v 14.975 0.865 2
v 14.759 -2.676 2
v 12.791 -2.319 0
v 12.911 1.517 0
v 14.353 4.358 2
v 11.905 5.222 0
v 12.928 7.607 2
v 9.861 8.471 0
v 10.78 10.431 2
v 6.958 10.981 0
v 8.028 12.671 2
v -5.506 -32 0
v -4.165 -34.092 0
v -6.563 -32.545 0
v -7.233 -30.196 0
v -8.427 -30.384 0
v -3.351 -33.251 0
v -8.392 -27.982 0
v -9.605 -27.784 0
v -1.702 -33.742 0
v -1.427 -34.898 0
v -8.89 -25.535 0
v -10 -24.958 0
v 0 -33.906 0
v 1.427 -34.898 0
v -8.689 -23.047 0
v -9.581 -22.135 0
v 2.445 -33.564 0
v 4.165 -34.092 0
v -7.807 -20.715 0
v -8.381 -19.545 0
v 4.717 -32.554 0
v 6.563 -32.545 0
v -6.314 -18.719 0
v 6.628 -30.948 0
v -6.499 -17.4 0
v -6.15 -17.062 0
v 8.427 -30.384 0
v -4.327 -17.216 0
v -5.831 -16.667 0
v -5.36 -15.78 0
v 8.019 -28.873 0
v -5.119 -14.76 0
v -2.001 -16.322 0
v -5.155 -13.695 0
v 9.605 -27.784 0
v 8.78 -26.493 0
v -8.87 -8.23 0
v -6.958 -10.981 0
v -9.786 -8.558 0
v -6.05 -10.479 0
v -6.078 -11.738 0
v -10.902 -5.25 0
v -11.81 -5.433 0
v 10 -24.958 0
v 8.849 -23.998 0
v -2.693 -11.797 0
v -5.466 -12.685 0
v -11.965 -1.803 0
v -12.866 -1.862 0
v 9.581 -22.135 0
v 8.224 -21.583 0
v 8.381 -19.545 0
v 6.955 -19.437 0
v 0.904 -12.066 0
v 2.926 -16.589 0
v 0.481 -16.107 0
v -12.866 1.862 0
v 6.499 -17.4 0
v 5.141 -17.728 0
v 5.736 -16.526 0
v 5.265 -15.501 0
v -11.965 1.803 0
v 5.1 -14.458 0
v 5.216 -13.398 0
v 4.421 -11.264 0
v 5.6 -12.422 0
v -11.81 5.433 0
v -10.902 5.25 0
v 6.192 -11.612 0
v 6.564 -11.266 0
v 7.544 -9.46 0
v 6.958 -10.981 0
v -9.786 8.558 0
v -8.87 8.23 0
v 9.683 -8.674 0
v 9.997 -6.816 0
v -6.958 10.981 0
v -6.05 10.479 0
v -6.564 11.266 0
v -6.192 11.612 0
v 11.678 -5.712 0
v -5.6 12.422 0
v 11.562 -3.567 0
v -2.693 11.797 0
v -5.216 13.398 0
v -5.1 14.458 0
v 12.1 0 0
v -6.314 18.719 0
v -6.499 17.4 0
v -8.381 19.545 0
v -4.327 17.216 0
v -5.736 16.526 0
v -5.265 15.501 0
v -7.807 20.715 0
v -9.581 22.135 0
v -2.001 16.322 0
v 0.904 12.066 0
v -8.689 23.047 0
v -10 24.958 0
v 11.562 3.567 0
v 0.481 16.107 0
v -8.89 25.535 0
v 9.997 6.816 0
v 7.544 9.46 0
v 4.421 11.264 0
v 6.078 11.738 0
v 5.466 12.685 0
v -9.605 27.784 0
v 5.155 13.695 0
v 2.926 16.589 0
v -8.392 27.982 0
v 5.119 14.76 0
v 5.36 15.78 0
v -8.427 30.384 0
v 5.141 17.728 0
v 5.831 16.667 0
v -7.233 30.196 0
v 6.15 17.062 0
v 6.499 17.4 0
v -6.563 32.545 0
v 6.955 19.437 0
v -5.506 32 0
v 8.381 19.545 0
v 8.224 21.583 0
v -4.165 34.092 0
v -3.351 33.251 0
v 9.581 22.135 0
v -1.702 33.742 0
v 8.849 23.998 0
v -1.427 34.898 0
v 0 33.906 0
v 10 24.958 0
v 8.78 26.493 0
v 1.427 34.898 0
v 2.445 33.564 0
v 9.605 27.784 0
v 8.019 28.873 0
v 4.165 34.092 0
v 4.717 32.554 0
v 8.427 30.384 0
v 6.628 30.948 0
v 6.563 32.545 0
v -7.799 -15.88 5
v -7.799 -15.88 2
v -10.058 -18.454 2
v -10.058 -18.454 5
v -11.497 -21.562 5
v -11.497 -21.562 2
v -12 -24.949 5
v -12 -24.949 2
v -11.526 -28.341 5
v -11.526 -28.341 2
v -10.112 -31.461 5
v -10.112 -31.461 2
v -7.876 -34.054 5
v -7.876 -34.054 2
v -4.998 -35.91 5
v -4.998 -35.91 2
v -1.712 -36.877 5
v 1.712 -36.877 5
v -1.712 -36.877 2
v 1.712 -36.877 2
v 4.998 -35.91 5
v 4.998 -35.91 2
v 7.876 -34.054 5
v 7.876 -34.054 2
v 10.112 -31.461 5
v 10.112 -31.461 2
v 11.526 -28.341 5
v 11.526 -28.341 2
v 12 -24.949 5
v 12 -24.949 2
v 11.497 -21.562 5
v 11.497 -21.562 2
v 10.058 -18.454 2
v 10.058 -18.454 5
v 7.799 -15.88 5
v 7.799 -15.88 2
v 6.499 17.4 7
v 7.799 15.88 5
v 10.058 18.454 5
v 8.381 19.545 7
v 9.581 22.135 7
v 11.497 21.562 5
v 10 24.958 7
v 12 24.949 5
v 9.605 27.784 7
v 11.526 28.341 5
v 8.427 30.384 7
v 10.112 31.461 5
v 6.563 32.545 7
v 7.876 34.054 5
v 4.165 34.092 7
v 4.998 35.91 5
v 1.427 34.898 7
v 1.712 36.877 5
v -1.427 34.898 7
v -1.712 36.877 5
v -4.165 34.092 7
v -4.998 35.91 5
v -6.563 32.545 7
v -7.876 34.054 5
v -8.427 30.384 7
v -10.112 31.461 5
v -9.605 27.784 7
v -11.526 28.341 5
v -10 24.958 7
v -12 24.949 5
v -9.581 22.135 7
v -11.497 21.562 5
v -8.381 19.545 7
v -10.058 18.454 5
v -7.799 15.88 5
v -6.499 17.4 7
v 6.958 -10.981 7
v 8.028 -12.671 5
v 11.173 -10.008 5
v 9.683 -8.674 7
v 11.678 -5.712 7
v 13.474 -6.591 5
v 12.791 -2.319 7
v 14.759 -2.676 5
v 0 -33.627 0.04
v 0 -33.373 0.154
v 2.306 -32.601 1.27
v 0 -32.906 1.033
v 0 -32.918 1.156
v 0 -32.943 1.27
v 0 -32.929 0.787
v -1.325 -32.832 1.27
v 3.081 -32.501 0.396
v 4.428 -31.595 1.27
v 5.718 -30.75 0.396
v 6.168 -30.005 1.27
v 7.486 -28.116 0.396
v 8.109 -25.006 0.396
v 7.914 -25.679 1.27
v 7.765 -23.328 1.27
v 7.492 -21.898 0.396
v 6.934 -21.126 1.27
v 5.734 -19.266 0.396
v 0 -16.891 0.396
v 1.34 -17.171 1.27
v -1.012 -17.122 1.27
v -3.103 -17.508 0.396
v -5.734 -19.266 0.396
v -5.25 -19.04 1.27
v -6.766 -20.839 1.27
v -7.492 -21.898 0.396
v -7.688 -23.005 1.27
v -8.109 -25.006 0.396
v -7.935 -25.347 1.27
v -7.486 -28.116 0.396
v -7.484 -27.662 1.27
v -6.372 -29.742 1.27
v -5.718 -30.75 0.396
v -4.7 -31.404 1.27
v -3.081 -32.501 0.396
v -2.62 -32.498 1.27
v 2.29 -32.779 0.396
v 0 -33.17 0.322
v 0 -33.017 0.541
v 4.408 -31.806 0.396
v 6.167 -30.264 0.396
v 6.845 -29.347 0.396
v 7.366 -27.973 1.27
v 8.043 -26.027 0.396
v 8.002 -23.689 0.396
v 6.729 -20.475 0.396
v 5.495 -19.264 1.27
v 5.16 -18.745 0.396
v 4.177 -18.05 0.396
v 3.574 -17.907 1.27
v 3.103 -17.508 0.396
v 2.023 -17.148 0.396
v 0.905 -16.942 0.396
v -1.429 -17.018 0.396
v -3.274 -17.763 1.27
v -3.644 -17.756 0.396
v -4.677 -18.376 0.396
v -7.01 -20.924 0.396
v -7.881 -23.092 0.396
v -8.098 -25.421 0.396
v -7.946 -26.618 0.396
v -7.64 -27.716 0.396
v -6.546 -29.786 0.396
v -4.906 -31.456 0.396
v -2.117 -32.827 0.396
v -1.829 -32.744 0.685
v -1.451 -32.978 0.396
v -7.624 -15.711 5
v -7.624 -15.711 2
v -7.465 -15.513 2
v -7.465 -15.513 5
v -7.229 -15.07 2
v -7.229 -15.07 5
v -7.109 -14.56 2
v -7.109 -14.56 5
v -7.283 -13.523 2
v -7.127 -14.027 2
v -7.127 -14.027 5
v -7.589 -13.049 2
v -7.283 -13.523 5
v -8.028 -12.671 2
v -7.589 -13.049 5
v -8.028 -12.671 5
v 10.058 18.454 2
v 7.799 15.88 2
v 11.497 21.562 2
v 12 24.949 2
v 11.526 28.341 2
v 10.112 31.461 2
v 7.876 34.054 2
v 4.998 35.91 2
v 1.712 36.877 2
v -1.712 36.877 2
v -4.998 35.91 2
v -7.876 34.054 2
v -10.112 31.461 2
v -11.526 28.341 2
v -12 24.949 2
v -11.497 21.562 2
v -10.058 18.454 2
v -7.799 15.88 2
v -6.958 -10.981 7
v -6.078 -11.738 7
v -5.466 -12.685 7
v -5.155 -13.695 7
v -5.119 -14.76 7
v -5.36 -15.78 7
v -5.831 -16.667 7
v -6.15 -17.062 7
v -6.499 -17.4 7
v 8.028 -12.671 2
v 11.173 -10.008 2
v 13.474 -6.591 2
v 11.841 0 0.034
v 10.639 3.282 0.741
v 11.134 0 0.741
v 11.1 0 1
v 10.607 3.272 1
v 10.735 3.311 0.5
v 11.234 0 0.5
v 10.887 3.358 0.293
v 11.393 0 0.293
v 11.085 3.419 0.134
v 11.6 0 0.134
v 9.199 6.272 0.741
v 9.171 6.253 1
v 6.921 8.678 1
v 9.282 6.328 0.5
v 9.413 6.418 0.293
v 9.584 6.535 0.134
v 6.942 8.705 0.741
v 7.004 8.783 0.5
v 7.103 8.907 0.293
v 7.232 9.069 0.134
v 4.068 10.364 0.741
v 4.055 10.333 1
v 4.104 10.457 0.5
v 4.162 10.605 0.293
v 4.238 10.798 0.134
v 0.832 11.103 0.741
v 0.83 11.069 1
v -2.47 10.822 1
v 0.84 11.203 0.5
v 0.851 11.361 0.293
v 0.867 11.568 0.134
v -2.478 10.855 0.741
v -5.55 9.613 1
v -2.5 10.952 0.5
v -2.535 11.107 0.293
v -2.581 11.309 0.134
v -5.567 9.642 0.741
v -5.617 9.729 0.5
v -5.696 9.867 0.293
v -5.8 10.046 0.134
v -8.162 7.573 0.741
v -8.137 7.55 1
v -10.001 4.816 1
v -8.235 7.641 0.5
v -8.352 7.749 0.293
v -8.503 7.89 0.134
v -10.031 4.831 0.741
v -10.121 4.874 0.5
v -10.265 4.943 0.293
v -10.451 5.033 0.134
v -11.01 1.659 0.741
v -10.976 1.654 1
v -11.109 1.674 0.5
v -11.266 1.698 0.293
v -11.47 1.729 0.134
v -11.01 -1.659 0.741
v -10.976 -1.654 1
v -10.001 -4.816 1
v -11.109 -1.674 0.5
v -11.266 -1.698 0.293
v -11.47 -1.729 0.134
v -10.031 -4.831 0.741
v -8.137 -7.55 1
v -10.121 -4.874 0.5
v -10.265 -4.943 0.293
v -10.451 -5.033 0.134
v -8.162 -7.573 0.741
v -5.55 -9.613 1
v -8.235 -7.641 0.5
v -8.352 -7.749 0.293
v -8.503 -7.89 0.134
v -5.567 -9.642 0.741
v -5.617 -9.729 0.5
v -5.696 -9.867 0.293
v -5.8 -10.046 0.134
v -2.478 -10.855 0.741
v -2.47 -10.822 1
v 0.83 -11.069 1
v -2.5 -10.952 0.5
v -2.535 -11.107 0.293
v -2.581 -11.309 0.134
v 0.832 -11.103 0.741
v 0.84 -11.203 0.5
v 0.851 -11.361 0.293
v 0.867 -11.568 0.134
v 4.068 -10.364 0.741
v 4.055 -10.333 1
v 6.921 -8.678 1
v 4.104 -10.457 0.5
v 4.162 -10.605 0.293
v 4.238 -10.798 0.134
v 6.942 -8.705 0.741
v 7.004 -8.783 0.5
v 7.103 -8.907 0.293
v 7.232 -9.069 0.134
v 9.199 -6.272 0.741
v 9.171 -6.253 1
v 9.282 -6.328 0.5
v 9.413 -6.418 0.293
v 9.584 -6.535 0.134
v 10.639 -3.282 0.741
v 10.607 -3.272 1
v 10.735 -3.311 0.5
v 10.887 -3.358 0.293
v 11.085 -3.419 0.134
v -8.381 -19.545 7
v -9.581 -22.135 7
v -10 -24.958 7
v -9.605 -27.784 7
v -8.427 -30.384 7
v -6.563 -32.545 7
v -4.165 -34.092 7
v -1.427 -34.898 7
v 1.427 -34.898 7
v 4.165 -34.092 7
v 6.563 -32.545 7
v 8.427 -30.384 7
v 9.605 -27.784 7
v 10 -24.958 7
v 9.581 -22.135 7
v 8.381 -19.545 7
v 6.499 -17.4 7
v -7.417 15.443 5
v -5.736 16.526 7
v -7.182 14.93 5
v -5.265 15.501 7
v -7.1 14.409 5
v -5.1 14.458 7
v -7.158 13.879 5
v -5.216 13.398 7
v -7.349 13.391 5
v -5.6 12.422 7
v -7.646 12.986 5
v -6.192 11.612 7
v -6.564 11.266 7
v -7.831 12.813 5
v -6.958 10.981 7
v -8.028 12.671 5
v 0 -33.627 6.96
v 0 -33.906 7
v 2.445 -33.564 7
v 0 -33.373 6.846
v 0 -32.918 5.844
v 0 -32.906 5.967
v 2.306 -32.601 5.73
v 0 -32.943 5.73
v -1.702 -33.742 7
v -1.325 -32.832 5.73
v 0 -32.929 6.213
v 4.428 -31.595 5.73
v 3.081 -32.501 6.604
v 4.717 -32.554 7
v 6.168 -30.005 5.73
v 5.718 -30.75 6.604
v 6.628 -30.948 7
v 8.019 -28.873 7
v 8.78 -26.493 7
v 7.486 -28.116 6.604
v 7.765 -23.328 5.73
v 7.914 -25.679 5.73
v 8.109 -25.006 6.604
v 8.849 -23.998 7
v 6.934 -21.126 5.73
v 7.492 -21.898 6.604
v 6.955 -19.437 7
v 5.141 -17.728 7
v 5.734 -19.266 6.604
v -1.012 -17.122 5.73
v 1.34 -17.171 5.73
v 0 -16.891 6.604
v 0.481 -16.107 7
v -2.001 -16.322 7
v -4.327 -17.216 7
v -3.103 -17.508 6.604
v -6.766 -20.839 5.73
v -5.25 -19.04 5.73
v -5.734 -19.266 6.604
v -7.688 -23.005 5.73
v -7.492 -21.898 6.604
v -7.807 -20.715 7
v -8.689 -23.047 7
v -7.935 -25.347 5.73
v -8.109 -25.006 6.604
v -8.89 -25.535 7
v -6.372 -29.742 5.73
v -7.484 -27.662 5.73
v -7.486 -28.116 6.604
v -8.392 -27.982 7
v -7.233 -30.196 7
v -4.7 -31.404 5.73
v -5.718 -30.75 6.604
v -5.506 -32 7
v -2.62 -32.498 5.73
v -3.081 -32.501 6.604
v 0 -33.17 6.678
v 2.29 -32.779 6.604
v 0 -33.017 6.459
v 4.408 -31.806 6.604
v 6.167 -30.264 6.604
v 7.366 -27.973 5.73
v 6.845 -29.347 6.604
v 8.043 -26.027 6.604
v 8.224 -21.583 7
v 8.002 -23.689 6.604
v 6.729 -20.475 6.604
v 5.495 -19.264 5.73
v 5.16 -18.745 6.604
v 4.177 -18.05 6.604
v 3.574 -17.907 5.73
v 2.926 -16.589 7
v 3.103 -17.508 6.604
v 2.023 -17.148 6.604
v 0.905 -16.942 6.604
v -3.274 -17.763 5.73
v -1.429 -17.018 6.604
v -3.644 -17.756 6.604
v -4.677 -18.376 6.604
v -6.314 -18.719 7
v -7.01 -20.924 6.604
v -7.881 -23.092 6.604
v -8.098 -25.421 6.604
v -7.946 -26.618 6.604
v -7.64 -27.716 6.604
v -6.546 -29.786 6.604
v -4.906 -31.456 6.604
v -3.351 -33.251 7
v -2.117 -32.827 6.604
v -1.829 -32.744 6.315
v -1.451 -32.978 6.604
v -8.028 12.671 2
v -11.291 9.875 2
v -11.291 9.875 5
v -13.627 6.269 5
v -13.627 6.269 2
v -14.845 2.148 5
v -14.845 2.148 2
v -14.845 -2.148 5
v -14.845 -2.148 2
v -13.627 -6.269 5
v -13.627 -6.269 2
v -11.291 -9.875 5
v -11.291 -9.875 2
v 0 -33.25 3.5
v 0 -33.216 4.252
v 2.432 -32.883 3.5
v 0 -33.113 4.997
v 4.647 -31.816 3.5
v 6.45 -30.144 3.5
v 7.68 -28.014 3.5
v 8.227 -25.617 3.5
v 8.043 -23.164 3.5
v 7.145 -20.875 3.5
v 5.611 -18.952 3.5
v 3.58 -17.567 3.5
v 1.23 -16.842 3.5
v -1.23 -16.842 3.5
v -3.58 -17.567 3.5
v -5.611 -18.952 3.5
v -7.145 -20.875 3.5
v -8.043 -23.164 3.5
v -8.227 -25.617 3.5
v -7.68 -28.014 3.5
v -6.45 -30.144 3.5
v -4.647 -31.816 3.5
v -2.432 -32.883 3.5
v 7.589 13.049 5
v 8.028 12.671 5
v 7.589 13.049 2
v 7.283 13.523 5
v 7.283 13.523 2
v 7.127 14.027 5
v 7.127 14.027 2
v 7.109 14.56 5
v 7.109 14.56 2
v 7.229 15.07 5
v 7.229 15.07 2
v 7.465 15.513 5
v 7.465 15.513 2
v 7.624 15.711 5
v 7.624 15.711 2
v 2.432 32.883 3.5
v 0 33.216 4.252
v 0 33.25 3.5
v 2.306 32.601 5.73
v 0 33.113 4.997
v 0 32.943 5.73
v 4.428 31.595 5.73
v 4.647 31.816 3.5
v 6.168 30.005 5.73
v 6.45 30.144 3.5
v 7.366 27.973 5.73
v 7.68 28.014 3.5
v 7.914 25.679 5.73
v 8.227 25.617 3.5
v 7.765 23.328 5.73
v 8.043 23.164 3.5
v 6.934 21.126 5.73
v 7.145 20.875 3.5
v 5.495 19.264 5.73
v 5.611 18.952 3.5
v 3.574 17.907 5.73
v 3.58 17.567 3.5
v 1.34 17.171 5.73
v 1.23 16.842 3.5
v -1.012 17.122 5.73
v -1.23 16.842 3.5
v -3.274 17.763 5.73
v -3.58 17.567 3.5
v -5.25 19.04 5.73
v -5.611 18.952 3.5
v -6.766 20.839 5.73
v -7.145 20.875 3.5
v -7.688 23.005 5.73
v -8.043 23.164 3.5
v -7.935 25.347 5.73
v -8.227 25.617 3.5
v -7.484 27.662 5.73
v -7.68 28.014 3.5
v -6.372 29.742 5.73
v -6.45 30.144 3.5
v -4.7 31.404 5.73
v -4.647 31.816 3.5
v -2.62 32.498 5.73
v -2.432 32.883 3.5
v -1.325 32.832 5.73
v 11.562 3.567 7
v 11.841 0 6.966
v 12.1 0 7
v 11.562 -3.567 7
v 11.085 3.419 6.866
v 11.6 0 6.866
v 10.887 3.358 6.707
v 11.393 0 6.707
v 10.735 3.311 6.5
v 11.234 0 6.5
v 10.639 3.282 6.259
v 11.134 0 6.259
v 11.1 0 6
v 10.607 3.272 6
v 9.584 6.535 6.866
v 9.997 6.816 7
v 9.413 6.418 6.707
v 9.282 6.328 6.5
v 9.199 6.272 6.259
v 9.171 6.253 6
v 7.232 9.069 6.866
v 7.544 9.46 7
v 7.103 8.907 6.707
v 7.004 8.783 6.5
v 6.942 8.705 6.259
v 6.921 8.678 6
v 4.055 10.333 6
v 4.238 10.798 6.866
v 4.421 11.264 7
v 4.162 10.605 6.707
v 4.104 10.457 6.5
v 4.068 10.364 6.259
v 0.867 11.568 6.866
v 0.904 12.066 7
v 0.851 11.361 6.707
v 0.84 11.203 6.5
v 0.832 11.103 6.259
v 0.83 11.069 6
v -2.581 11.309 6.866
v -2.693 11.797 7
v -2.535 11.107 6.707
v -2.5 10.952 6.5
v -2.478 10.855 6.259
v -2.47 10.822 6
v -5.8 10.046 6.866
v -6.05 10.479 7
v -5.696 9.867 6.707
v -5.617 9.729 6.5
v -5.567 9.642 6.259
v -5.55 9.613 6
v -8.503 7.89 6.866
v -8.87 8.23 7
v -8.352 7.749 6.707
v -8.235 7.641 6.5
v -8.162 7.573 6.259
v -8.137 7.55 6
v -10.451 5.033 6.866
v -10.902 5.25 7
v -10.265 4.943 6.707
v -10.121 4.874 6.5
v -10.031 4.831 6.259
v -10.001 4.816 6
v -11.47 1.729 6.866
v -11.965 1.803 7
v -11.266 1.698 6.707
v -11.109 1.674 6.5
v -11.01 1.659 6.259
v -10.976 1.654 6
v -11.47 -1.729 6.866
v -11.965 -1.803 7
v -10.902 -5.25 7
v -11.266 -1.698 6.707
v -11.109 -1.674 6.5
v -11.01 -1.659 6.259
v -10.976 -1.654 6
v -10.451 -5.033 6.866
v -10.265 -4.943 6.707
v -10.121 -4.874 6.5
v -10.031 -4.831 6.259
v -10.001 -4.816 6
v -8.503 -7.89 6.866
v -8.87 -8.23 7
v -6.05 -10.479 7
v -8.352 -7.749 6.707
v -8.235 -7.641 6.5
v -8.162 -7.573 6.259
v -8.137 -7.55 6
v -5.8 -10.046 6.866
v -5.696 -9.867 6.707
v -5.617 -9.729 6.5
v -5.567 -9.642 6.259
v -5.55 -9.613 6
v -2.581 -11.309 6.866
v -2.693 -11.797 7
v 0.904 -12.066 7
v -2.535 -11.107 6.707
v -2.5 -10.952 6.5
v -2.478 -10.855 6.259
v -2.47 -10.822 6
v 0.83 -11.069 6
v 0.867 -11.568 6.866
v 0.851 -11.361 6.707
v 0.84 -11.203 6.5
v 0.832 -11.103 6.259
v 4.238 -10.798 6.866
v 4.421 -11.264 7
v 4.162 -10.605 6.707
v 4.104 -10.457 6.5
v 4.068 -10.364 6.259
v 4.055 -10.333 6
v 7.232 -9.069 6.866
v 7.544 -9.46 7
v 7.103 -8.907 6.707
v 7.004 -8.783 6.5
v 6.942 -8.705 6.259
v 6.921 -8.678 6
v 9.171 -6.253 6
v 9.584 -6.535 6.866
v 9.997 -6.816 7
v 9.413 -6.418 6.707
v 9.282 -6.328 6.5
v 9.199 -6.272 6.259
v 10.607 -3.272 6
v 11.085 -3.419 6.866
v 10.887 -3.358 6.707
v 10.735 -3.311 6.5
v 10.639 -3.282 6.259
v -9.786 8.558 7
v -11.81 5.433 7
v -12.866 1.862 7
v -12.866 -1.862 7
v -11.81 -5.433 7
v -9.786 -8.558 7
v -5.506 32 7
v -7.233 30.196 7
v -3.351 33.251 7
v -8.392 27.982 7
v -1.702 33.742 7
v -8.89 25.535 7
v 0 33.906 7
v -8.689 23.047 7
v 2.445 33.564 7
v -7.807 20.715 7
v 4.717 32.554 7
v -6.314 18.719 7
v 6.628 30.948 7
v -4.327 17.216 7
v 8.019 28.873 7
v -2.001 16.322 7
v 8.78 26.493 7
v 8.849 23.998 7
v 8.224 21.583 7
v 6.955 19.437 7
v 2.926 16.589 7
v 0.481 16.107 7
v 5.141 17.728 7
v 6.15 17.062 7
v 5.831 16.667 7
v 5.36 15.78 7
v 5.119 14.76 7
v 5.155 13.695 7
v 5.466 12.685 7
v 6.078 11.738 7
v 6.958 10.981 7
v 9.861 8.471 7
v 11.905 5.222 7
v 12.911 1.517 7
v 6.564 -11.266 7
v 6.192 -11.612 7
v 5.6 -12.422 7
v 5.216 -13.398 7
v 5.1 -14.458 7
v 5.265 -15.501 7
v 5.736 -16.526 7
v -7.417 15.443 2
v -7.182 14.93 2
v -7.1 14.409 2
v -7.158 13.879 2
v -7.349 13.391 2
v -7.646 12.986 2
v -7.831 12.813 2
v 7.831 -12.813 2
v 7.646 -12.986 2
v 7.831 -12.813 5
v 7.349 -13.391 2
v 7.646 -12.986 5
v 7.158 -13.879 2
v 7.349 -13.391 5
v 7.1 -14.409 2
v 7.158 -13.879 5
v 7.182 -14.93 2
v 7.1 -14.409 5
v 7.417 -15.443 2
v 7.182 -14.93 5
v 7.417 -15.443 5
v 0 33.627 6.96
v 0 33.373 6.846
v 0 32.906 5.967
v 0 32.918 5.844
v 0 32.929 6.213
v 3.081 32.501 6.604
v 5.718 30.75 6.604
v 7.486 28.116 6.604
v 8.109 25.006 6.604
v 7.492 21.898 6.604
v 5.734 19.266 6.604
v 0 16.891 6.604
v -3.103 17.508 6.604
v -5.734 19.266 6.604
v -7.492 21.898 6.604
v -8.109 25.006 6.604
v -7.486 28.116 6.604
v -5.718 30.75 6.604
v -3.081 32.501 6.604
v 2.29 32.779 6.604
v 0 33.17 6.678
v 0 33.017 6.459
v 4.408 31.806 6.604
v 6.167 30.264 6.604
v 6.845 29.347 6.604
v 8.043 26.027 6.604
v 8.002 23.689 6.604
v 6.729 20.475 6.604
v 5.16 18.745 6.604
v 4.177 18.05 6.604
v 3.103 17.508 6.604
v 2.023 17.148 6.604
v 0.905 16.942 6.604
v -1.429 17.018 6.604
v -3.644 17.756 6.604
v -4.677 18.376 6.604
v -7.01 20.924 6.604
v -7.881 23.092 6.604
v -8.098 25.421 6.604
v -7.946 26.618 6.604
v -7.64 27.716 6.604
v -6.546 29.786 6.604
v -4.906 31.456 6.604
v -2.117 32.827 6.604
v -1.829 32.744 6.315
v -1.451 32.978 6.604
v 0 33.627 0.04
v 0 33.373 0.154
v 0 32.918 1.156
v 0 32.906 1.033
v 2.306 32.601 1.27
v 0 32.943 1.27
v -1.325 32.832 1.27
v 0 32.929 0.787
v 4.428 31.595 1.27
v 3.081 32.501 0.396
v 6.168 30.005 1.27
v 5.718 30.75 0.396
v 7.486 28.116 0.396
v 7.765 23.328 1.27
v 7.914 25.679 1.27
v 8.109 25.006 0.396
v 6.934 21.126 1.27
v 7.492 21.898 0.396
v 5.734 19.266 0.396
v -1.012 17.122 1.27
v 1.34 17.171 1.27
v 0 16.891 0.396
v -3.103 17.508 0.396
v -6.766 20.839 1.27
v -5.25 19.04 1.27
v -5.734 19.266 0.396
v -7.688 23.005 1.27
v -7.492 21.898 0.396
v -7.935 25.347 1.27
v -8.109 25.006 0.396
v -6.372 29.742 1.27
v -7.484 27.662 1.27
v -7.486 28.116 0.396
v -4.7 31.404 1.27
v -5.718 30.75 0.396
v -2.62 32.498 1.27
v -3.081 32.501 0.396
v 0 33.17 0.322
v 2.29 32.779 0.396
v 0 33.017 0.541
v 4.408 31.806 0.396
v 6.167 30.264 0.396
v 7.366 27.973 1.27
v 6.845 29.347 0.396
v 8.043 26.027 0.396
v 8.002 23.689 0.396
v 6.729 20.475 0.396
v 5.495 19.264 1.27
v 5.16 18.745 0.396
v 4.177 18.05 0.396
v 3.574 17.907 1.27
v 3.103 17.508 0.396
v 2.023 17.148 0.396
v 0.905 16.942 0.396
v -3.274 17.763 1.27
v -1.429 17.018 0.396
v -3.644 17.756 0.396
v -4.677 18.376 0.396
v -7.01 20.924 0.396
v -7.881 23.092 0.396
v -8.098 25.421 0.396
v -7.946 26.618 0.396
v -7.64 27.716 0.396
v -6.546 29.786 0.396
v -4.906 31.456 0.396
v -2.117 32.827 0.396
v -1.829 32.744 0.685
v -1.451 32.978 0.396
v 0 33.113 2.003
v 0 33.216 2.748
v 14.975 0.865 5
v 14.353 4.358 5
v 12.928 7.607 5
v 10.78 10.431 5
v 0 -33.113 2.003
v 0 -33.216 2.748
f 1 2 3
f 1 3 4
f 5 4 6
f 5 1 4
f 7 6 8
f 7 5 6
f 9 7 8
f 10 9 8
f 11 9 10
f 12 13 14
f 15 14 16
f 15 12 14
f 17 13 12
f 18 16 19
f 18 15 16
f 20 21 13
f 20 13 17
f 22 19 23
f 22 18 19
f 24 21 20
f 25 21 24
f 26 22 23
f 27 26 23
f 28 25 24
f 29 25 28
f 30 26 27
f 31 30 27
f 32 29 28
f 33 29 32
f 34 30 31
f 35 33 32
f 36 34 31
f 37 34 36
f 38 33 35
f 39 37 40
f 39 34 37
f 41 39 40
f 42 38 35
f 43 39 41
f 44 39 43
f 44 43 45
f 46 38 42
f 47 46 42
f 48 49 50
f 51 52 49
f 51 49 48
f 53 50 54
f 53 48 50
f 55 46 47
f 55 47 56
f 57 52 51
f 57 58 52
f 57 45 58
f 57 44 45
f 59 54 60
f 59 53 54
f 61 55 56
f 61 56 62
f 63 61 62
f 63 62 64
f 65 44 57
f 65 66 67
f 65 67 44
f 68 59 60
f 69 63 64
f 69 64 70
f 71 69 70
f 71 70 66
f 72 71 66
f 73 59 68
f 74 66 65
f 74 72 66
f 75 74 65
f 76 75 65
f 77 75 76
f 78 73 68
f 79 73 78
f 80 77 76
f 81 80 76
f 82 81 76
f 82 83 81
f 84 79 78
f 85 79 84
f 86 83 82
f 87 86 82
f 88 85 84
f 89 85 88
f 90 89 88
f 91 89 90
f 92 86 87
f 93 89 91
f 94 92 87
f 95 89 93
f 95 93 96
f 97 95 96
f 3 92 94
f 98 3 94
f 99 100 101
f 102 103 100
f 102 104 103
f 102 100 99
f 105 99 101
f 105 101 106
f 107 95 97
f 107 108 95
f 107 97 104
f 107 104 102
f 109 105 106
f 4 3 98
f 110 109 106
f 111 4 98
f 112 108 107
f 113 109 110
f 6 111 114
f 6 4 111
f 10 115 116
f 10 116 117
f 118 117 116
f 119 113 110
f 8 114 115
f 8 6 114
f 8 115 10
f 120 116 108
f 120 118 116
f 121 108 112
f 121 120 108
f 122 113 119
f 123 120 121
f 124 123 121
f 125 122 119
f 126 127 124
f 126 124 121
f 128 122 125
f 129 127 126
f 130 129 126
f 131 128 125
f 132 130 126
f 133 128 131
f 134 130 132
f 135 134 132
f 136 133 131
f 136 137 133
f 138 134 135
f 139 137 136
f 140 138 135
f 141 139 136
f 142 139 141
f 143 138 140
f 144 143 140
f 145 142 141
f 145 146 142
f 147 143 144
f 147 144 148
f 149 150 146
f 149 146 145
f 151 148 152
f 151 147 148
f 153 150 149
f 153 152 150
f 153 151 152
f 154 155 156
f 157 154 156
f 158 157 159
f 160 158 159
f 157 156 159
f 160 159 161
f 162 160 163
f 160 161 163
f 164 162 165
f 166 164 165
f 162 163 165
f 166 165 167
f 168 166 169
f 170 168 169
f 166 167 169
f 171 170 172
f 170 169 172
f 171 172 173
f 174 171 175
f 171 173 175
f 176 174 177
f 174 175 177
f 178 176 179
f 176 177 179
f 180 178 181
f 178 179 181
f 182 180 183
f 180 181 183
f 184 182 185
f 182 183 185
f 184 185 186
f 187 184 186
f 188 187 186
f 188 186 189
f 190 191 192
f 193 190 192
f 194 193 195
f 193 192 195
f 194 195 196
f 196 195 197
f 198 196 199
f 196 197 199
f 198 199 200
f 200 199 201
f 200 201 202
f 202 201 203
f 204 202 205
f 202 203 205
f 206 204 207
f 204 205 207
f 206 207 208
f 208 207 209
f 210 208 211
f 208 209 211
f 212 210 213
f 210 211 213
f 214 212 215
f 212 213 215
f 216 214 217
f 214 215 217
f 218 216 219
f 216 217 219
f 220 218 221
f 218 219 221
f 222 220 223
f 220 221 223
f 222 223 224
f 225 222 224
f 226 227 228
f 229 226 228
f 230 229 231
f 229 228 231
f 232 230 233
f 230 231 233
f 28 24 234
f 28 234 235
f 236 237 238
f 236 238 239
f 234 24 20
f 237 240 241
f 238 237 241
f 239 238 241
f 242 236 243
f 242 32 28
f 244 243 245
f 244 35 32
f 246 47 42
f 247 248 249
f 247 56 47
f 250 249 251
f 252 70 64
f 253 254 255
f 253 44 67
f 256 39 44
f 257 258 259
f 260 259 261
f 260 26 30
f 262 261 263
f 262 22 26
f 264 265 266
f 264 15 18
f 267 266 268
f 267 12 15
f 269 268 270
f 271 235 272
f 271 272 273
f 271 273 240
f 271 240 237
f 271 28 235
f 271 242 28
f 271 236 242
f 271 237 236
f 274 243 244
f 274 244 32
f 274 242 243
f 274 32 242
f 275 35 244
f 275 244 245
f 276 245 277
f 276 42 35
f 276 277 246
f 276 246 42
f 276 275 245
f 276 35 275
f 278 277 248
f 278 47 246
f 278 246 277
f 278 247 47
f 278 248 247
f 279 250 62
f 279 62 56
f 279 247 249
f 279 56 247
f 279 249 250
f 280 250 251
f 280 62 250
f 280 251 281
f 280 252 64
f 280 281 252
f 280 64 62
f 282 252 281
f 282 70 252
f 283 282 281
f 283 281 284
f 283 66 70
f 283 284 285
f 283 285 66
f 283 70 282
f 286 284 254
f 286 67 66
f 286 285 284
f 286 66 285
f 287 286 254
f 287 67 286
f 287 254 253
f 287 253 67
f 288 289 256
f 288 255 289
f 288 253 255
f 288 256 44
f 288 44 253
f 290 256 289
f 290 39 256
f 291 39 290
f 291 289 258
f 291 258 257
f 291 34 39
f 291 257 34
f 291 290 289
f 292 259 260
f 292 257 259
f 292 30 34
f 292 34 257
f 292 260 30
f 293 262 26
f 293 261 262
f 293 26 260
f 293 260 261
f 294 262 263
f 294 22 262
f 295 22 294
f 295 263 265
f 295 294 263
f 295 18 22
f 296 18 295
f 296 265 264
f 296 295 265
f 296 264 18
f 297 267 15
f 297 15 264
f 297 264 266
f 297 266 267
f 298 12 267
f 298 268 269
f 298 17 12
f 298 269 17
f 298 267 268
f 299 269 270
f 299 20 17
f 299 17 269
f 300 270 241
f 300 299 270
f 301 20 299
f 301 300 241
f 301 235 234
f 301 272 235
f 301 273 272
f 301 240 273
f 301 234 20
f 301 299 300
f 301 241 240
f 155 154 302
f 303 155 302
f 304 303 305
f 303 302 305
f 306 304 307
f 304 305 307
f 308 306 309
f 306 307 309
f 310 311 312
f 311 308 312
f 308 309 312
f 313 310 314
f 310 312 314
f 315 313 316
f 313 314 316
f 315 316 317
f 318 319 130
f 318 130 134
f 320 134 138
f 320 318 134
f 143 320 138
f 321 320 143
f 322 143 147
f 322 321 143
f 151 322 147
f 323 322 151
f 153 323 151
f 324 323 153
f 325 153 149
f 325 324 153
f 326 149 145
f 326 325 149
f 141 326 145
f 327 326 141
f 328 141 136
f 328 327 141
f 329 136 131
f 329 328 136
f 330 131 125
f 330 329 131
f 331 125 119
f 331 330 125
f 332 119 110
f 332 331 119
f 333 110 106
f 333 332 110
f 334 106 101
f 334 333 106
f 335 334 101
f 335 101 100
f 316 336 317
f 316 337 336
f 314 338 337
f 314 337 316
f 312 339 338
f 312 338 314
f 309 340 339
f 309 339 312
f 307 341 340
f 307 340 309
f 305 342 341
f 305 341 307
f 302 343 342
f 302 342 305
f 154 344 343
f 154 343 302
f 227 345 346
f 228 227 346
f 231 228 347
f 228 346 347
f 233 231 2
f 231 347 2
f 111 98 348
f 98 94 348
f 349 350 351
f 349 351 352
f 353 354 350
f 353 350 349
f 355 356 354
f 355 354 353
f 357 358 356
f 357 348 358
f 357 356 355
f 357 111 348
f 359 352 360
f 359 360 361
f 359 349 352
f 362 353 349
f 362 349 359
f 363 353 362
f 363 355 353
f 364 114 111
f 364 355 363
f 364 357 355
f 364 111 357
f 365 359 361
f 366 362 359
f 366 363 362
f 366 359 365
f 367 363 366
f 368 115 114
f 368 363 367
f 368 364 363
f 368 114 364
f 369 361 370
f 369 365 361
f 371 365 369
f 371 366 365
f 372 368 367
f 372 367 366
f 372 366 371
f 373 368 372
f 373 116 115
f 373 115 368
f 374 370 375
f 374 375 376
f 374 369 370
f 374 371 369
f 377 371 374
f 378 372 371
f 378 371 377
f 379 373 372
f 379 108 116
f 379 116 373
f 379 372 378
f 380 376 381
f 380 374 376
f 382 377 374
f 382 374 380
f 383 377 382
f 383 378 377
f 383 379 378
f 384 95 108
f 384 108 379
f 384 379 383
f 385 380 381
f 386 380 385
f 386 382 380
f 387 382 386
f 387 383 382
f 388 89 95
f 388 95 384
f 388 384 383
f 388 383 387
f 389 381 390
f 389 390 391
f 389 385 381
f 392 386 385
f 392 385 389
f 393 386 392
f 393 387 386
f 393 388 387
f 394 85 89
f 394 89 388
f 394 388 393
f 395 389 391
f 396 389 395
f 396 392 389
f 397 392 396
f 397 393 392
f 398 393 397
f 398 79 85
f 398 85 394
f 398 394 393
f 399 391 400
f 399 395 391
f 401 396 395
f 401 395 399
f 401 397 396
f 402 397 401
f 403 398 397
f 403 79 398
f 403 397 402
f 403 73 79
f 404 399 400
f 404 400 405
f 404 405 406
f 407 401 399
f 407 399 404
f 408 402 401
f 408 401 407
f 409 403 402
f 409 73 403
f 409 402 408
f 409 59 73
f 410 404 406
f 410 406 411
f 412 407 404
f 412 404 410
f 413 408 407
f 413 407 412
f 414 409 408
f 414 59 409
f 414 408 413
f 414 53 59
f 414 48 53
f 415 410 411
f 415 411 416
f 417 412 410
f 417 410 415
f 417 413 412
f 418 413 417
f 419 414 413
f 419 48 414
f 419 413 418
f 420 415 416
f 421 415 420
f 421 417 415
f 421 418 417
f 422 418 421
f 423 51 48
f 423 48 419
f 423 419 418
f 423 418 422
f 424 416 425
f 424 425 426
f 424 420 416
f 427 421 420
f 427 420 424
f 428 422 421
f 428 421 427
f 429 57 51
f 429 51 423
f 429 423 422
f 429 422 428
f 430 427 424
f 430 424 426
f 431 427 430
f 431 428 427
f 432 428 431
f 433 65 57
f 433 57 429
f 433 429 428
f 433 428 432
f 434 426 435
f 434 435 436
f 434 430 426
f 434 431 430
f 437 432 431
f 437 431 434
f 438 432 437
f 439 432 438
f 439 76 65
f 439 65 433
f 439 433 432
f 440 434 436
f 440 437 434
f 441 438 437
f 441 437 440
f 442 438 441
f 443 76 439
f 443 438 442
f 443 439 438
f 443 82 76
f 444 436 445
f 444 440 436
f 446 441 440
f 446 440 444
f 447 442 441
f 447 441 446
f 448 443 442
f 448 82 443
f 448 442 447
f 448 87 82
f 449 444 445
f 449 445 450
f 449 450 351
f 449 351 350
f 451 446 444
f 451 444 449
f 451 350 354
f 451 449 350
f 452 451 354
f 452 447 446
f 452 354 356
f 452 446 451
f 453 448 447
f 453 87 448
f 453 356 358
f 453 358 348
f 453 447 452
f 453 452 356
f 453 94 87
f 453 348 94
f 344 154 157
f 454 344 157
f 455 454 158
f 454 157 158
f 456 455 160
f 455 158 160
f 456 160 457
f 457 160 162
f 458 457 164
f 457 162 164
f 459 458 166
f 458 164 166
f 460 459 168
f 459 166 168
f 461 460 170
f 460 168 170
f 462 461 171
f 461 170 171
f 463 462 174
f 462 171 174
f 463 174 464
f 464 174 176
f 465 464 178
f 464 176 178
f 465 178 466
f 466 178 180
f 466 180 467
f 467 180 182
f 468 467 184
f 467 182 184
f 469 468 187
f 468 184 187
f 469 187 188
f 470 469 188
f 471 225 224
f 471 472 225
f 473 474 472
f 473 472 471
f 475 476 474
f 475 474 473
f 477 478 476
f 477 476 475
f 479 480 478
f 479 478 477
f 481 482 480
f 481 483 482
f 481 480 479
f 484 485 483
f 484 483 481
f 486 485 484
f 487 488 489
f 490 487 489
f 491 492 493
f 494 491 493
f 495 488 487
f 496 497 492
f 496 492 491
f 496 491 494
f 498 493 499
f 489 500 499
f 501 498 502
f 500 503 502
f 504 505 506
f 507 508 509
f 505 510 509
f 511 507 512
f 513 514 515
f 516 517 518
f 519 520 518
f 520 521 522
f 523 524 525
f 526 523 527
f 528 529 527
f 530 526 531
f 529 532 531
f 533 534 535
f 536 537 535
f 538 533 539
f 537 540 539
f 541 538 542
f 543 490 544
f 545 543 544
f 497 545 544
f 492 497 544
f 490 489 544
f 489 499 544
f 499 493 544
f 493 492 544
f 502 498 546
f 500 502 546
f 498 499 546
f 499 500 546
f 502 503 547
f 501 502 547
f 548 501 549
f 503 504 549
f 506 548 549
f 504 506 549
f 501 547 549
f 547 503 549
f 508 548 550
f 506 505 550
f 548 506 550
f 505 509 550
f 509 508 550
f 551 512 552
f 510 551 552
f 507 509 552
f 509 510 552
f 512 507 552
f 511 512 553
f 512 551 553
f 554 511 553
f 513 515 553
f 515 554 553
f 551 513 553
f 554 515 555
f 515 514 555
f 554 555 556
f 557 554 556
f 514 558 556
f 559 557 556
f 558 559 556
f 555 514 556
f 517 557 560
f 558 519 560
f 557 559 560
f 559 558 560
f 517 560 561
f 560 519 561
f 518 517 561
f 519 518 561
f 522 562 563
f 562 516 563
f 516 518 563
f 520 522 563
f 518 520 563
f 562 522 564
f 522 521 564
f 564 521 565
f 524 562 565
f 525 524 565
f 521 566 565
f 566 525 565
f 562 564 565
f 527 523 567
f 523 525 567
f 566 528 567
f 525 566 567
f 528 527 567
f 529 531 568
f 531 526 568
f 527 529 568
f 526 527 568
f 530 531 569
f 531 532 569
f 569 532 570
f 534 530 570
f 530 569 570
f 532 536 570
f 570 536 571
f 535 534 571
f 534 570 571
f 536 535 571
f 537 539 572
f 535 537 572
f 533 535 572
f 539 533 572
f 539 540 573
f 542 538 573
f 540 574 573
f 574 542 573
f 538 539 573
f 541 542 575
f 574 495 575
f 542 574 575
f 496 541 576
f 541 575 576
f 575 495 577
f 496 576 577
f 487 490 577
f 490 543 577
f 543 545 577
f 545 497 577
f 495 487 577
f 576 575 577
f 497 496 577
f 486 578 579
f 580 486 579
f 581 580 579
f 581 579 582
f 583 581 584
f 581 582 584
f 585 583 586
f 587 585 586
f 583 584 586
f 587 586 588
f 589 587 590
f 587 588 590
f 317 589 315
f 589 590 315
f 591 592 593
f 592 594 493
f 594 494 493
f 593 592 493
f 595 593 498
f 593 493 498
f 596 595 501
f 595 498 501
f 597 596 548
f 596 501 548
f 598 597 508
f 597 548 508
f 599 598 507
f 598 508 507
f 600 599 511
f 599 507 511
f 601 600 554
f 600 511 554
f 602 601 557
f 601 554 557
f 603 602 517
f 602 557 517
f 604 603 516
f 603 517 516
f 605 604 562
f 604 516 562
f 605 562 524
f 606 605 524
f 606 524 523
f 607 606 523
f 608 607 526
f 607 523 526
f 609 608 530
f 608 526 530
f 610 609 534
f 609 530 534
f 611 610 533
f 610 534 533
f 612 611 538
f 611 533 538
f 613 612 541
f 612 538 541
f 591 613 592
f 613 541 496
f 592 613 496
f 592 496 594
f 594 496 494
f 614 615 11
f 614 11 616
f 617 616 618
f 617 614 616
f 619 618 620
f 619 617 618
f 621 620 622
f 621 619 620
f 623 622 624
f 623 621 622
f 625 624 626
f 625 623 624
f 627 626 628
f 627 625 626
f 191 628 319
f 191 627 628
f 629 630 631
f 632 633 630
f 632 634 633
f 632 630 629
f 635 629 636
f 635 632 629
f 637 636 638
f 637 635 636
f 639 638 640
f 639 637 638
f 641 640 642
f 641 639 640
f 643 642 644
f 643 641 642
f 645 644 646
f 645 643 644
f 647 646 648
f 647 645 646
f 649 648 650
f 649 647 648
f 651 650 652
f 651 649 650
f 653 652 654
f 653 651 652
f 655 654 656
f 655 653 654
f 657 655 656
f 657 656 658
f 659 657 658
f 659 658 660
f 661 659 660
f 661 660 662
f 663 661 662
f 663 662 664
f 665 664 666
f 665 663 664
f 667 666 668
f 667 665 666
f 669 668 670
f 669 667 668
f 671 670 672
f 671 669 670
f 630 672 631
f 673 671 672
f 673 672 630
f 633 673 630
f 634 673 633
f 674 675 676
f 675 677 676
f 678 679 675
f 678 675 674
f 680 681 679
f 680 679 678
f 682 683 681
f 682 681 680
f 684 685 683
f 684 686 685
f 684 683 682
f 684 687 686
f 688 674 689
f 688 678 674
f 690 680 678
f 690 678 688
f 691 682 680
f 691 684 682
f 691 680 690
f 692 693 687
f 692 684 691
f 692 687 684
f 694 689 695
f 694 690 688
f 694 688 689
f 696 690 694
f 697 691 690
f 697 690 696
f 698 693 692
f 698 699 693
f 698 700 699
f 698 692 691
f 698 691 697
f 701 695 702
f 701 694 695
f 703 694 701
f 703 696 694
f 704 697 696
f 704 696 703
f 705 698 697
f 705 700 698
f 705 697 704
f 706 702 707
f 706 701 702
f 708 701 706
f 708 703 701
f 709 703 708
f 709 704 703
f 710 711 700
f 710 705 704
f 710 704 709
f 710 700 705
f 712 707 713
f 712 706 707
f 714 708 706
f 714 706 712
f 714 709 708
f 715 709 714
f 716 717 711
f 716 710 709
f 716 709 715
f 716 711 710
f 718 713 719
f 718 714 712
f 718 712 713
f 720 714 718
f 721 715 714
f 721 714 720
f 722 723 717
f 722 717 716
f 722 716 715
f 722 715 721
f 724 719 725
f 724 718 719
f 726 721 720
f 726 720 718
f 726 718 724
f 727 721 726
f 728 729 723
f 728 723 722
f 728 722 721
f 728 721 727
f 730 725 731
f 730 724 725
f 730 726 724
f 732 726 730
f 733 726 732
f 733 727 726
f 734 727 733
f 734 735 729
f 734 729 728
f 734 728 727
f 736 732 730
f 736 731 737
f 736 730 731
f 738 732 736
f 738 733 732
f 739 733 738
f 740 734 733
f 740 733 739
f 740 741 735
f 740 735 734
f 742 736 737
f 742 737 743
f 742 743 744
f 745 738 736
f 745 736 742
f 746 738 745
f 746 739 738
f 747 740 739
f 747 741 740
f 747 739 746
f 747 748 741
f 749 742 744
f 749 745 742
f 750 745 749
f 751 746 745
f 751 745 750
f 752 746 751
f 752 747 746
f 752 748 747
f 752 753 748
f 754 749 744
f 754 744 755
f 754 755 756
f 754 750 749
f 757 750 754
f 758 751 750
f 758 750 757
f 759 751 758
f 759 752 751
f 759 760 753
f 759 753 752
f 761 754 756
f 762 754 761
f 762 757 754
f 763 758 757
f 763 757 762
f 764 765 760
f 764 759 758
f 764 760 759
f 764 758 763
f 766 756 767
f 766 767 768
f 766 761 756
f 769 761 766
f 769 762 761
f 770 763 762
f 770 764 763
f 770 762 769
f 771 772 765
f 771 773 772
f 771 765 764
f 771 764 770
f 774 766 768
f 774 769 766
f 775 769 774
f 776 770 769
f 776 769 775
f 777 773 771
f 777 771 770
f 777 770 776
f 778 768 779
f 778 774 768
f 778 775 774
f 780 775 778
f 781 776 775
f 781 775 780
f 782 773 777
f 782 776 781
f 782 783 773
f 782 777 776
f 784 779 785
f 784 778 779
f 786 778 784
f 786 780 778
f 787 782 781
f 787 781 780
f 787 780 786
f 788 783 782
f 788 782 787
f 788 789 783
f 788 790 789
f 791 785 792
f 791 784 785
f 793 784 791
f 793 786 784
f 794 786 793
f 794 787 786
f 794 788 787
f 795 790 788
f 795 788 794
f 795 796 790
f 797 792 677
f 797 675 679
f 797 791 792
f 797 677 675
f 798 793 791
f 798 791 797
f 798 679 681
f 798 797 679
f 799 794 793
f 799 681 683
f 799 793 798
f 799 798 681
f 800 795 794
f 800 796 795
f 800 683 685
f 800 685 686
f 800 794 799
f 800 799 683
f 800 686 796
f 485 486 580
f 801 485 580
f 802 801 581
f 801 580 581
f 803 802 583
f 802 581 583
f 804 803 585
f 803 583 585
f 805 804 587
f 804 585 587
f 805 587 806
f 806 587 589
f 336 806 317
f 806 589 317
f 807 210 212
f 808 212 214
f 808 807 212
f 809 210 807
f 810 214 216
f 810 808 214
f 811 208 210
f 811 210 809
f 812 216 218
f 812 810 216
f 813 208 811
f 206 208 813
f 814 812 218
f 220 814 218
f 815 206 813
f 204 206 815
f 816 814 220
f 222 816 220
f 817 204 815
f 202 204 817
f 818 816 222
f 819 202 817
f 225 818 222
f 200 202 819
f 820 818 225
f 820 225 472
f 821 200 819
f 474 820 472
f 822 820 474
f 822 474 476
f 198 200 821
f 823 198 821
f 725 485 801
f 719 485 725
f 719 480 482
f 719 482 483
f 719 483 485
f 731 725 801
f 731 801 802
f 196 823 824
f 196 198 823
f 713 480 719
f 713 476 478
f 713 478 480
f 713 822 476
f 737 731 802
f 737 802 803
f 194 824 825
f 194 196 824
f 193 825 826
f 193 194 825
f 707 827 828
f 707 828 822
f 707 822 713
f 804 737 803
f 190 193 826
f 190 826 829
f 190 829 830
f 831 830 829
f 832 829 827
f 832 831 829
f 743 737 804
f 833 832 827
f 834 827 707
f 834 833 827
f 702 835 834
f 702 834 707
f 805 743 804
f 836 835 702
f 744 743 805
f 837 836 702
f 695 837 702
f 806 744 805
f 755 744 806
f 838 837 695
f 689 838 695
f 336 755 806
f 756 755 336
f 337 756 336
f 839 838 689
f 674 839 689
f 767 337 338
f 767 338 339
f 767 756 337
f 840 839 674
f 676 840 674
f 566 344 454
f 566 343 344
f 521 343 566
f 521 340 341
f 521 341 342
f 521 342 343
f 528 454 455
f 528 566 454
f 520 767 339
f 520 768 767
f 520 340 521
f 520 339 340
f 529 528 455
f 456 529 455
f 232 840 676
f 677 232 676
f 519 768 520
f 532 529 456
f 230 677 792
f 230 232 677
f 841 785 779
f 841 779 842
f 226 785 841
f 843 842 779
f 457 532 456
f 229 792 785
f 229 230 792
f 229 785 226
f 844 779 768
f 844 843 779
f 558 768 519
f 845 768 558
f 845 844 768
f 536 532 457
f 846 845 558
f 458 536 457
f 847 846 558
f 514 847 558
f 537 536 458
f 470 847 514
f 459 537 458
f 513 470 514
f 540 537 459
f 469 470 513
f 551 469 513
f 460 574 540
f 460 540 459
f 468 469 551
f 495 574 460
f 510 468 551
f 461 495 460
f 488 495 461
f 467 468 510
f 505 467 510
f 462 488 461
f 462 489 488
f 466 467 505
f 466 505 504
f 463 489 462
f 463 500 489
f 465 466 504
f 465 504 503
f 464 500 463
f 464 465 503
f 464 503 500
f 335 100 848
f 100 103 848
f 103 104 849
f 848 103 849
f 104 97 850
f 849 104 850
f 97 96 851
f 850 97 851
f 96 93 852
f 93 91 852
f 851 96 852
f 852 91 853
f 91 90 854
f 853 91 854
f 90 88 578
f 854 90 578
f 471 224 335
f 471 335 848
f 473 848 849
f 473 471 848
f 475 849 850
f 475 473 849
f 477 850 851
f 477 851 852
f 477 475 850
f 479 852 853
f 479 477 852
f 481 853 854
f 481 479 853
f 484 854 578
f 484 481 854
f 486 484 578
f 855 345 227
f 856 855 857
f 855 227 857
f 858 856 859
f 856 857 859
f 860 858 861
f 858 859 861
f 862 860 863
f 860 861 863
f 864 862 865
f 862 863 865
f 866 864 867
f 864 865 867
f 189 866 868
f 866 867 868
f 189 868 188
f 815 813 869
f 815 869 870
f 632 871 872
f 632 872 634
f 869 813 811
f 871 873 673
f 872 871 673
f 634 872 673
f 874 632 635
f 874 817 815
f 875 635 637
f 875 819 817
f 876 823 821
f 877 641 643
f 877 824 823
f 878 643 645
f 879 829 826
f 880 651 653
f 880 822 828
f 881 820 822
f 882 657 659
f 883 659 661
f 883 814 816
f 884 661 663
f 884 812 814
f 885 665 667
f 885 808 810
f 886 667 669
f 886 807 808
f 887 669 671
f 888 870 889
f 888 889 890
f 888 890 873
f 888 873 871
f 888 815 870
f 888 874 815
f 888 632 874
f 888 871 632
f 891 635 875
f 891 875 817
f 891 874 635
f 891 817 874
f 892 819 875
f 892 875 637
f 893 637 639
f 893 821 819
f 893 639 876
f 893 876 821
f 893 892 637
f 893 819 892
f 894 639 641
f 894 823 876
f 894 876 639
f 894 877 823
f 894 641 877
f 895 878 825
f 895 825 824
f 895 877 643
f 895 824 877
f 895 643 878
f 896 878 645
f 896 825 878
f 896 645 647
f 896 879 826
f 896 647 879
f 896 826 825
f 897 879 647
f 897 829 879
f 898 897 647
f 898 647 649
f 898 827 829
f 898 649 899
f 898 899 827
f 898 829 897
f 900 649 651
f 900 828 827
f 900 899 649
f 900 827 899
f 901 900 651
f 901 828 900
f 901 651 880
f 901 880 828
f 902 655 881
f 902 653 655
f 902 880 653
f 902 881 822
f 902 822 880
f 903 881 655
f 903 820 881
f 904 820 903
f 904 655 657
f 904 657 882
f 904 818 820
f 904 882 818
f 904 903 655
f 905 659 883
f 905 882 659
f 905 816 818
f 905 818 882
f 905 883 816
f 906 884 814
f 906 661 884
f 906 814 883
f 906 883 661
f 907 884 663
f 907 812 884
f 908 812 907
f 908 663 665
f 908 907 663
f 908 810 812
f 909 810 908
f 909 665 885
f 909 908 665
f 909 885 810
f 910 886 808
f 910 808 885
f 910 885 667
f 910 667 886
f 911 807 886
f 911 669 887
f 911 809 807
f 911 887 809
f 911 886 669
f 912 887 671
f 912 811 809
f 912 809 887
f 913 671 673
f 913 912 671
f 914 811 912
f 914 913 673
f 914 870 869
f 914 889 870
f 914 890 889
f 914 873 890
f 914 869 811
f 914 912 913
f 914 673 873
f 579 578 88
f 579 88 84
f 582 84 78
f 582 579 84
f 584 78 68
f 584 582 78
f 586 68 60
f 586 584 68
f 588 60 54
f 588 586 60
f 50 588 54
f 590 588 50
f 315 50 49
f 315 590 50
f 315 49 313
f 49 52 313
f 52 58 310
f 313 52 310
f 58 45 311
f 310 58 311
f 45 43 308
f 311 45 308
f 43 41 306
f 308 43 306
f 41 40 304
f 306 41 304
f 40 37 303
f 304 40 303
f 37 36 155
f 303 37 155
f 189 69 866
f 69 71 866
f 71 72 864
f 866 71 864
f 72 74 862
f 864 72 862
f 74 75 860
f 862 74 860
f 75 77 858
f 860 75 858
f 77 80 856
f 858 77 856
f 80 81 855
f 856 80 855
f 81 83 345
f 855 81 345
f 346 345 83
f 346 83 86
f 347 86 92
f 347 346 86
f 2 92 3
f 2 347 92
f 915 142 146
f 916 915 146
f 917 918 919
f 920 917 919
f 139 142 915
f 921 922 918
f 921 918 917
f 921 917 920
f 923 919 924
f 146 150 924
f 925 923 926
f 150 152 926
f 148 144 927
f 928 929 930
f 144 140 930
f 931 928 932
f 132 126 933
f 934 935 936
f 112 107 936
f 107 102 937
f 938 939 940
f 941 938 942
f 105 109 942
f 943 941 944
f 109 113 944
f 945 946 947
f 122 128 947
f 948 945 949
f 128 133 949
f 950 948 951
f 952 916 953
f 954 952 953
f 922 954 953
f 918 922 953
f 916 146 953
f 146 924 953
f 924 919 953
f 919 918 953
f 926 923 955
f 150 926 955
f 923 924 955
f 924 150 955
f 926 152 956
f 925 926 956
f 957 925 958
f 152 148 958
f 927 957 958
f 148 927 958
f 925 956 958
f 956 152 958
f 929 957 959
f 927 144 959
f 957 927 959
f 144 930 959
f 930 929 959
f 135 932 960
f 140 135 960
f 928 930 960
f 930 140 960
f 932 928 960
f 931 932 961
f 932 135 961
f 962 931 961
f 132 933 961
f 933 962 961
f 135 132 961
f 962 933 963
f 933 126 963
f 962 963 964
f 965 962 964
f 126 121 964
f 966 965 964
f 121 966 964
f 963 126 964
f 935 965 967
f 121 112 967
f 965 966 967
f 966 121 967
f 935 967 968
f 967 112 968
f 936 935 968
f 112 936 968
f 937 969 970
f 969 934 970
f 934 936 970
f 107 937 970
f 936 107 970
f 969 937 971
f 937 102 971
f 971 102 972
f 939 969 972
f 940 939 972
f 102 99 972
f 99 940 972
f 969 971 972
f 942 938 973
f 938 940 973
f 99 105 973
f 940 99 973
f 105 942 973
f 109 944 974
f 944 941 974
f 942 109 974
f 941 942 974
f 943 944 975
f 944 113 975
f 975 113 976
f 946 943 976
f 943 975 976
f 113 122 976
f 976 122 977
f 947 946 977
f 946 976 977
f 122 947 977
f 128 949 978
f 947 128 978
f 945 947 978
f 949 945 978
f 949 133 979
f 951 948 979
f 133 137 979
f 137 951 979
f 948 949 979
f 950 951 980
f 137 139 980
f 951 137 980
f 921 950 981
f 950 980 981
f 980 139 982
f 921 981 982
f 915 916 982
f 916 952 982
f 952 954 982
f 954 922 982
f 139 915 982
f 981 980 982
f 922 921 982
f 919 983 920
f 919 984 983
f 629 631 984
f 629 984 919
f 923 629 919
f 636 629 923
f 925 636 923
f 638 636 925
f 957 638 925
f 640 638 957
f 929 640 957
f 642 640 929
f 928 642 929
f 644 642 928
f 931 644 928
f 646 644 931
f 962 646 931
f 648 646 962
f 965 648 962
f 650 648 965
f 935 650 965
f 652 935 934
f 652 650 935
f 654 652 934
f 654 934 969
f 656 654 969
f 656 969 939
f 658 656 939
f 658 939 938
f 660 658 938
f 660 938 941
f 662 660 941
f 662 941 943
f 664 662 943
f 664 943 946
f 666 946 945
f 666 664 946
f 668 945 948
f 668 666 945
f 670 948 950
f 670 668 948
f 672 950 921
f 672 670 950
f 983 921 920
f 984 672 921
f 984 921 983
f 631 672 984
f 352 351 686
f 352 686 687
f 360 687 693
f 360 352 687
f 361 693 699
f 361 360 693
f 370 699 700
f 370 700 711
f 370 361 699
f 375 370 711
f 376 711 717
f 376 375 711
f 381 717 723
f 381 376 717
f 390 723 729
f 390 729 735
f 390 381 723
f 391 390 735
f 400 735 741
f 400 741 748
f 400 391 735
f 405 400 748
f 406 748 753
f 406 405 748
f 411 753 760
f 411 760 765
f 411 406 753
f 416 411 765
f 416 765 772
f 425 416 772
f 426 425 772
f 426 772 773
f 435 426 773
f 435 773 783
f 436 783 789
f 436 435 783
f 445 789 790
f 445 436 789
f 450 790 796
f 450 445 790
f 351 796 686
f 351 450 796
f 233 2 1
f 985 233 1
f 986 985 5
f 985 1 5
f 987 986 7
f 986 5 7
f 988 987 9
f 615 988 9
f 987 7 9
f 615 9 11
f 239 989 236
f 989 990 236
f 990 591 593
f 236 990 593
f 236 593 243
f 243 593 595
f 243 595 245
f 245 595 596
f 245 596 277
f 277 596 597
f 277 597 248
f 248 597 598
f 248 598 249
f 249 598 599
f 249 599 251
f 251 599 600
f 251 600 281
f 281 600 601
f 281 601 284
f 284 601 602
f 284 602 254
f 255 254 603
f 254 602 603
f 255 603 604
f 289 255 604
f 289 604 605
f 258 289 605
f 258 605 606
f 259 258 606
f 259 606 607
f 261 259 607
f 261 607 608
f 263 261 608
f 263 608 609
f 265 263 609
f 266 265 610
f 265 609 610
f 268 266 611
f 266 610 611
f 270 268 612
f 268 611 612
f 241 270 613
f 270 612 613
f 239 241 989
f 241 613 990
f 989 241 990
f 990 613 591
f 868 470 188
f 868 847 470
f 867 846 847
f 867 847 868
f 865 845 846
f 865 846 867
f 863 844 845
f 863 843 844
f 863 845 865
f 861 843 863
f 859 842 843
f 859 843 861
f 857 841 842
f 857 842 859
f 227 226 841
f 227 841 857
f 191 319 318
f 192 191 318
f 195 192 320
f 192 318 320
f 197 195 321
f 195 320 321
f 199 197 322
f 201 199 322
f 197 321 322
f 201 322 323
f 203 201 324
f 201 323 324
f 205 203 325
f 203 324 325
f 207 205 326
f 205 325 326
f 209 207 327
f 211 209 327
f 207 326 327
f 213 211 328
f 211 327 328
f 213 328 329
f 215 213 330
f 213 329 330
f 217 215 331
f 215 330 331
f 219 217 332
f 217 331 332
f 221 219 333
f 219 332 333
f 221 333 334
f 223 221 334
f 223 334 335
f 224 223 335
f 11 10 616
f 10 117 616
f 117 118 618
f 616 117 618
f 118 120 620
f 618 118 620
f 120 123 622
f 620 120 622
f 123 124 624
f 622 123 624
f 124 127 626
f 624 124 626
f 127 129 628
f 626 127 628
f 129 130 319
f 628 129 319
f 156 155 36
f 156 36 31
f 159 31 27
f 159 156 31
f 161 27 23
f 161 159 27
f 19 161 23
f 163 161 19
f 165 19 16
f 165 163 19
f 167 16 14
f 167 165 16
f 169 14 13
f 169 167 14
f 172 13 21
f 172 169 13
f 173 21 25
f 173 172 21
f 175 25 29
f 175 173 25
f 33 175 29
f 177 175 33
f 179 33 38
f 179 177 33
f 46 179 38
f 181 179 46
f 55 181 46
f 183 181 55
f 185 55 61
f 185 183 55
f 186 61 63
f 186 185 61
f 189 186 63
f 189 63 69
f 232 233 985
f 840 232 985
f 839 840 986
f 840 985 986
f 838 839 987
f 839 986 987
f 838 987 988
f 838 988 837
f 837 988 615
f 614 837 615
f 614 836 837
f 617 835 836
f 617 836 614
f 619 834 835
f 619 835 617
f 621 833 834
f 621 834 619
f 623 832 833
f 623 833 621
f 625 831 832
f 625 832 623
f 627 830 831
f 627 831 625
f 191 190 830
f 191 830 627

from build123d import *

# Parameters (mm, degrees)
F0_R     = 8.25
F0_R_2   = 11.1
F1_DEPTH = 7
F2_R     = 2
F3_SIZE  = 2
F9_R     = 1


# Not quite as in the source:
# - a pattern or mirror of a feature is missing from the dataset's text; its kind, count and spacing are read off the source's solid
# - a feature names something its author has since deleted; it is built from what else it names


with BuildPart() as f1:
    # F0 (on Top) → F1 (new body)
    with BuildSketch(Plane.XY):
        with BuildLine():
            ThreePointArc((14.7593654246, -2.6760291972), (12.9903810568, 7.5), (5.0621734463, 14.12))
            ThreePointArc((5.0621734463, 14.12), (0, 37), (-5.0621734463, 14.12))
            ThreePointArc((-5.0621734463, 14.12), (-15, 0), (-5.0621734463, -14.12))
            ThreePointArc((-5.0621734463, -14.12), (0, -37), (5.0621734463, -14.12))
            ThreePointArc((5.0621734463, -14.12), (11.4439708028, -9.6971919783), (14.7593654246, -2.6760291972))
        make_face()
        with Locations((0, -25)):
            Circle(F0_R, mode=Mode.SUBTRACT)
        Circle(F0_R_2, mode=Mode.SUBTRACT)
        with Locations((0, 25)):
            Circle(F0_R, mode=Mode.SUBTRACT)
    extrude(amount=F1_DEPTH)

    # F2
    f2_edges = [f1.edges().sort_by_distance(p)[0] for p in [
        (5.062173, -14.12, 3.5),
        (5.062173, 14.12, 3.5),
        (-5.062173, 14.12, 3.5),
        (-5.062173, -14.12, 3.5),
    ]]
    fillet(f2_edges, radius=F2_R)

    # F3
    f3_edges = [f1.edges().sort_by_distance(p)[0] for p in [
        (0, -37, 7),
        (0, -37, 0),
        (15, 0, 7),
        (15, 0, 0),
        (7.104012, 14.217419, 7),
        (7.104012, -14.217419, 7),
        (0, 37, 7),
        (-7.104012, 14.217419, 7),
        (-7.104012, -14.217419, 7),
        (-15, 0, 7),
        (7.104012, 14.217419, 0),
        (7.104012, -14.217419, 0),
        (0, 37, 0),
        (-7.104012, -14.217419, 0),
        (-7.104012, 14.217419, 0),
        (-15, 0, 0),
    ]]
    chamfer(f3_edges, length=F3_SIZE)

    # F7 (on 3pt) → F8 (revolve)
    with BuildSketch(Plane.YZ):
        with BuildLine():
            Line((-32.4707763987, 7), (-33.25, 7))
            Line((-33.25, 7), (-33.25, 3.5))
            ThreePointArc((-33.25, 3.5), (-33.0528381733, 5.2928461605), (-32.4707763987, 7))
        make_face()
        with BuildLine():
            ThreePointArc((-32.4707763987, 0), (-33.0528381733, 1.7071538395), (-33.25, 3.5))
            Line((-33.25, 3.5), (-33.25, 0))
            Line((-33.25, 0), (-32.4707763987, 0))
        make_face()
    f8 = revolve(axis=Axis((0, -25, 3.5), (0, 0, 1)))

    # F8_copies: F8 across plane
    add(f8.mirror(Plane.ZX))

    # F9
    f9_edges = [f1.edges().sort_by_distance(p)[0] for p in [
        (0, -17.529224, 7),
        (0, -17.529224, 0),
        (-11.1, 0, 0),
        (-11.1, 0, 7),
        (0, 17.529224, 7),
        (0, 17.529224, 0),
    ]]
    fillet(f9_edges, radius=F9_R)


solid = f1.part
